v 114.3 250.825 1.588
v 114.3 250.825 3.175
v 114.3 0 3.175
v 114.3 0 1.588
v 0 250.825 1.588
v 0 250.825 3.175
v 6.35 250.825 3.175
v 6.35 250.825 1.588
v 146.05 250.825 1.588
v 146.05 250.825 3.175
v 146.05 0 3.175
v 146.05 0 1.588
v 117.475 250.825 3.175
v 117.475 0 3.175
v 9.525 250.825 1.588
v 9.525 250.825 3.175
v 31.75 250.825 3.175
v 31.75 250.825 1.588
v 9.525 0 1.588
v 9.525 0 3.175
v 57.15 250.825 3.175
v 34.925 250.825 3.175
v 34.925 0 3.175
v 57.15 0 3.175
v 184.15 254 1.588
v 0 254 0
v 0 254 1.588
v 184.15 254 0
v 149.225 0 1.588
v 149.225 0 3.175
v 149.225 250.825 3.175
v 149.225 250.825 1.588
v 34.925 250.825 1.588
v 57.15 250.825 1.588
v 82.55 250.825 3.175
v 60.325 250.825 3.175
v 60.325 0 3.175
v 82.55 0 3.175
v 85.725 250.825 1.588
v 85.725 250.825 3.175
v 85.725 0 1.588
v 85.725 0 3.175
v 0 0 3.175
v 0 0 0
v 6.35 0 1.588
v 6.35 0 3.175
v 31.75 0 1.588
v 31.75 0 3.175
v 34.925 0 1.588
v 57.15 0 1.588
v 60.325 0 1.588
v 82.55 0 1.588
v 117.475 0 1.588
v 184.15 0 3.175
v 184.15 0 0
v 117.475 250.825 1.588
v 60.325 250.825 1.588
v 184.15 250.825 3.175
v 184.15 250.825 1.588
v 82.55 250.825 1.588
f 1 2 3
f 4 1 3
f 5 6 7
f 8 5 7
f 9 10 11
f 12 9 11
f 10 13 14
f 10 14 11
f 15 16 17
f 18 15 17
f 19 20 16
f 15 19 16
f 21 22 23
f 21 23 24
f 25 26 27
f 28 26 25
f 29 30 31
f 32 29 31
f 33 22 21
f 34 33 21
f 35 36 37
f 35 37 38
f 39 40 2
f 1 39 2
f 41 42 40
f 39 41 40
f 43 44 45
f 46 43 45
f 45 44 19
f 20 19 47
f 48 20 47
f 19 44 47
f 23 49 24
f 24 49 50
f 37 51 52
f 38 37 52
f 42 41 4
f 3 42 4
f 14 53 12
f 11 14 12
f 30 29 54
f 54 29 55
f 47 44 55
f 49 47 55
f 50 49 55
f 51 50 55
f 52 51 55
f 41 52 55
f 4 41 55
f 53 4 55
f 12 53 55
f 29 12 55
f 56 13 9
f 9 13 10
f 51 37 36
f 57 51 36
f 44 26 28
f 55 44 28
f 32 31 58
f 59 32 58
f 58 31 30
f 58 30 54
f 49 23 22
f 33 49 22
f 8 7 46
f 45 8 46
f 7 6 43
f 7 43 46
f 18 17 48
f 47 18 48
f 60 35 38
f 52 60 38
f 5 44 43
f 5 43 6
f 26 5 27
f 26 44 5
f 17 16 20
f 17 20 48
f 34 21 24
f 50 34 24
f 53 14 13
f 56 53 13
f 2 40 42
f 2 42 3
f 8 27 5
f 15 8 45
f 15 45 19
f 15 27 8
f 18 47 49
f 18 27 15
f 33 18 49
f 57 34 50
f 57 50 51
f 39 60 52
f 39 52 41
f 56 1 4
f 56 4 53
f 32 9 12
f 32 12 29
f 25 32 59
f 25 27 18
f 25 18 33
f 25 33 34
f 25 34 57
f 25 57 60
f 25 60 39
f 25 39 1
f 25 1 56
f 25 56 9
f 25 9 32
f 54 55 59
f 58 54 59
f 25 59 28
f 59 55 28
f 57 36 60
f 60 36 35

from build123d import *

# Parameters (mm, degrees)
F0_W     = 184.15
F0_H     = 254
F1_DEPTH = 3.175
F2_W     = 3.175
F2_H     = 250.825
F2_H_2   = 3.175
F3_DEPTH = 1.5875
F2_W_2   = 6.35
F2_W_3   = 22.225
F2_W_4   = 28.575
F2_W_5   = 34.925
F4_DEPTH = 1.5875


with BuildPart() as f1:
    # F0 (on Top) → F1 (new body)
    with BuildSketch(Plane.XY):
        with Locations((92.075, 127)):
            Rectangle(F0_W, F0_H)
    extrude(amount=F1_DEPTH)

    # F2 (on face) → F3 (cut)
    with BuildSketch(Plane.XY.offset(3.175)):
        with Locations((7.9375, 125.4125)):
            Rectangle(F2_W, F2_H)
        with Locations((33.3375, 125.4125)):
            Rectangle(F2_W, F2_H)
        with Locations((58.7375, 125.4125)):
            Rectangle(F2_W, F2_H)
        with Locations((84.1375, 125.4125)):
            Rectangle(F2_W, F2_H)
        with Locations((115.8875, 252.4125)):
            Rectangle(F2_W, F2_H_2)
        with Locations((147.6375, 252.4125)):
            Rectangle(F2_W, F2_H_2)
        with Locations((115.8875, 125.4125)):
            Rectangle(F2_W, F2_H)
        with Locations((147.6375, 125.4125)):
            Rectangle(F2_W, F2_H)
        with Locations((84.1375, 252.4125)):
            Rectangle(F2_W, F2_H_2)
        with Locations((58.7375, 252.4125)):
            Rectangle(F2_W, F2_H_2)
        with Locations((33.3375, 252.4125)):
            Rectangle(F2_W, F2_H_2)
        with Locations((7.9375, 252.4125)):
            Rectangle(F2_W, F2_H_2)
    extrude(amount=-F3_DEPTH, mode=Mode.SUBTRACT)

    # F2 (on face) → F4 (cut)
    with BuildSketch(Plane.XY.offset(3.175)):
        with Locations((3.175, 252.4125)):
            Rectangle(F2_W_2, F2_H_2)
        with Locations((20.6375, 252.4125)):
            Rectangle(F2_W_3, F2_H_2)
        with Locations((33.3375, 252.4125)):
            Rectangle(F2_W, F2_H_2)
        with Locations((46.0375, 252.4125)):
            Rectangle(F2_W_3, F2_H_2)
        with Locations((7.9375, 252.4125)):
            Rectangle(F2_W, F2_H_2)
        with Locations((58.7375, 252.4125)):
            Rectangle(F2_W, F2_H_2)
        with Locations((71.4375, 252.4125)):
            Rectangle(F2_W_3, F2_H_2)
        with Locations((100.0125, 252.4125)):
            Rectangle(F2_W_4, F2_H_2)
        with Locations((84.1375, 252.4125)):
            Rectangle(F2_W, F2_H_2)
        with Locations((115.8875, 252.4125)):
            Rectangle(F2_W, F2_H_2)
        with Locations((131.7625, 252.4125)):
            Rectangle(F2_W_4, F2_H_2)
        with Locations((147.6375, 252.4125)):
            Rectangle(F2_W, F2_H_2)
        with Locations((166.6875, 252.4125)):
            Rectangle(F2_W_5, F2_H_2)
    extrude(amount=-F4_DEPTH, mode=Mode.SUBTRACT)


solid = f1.part
